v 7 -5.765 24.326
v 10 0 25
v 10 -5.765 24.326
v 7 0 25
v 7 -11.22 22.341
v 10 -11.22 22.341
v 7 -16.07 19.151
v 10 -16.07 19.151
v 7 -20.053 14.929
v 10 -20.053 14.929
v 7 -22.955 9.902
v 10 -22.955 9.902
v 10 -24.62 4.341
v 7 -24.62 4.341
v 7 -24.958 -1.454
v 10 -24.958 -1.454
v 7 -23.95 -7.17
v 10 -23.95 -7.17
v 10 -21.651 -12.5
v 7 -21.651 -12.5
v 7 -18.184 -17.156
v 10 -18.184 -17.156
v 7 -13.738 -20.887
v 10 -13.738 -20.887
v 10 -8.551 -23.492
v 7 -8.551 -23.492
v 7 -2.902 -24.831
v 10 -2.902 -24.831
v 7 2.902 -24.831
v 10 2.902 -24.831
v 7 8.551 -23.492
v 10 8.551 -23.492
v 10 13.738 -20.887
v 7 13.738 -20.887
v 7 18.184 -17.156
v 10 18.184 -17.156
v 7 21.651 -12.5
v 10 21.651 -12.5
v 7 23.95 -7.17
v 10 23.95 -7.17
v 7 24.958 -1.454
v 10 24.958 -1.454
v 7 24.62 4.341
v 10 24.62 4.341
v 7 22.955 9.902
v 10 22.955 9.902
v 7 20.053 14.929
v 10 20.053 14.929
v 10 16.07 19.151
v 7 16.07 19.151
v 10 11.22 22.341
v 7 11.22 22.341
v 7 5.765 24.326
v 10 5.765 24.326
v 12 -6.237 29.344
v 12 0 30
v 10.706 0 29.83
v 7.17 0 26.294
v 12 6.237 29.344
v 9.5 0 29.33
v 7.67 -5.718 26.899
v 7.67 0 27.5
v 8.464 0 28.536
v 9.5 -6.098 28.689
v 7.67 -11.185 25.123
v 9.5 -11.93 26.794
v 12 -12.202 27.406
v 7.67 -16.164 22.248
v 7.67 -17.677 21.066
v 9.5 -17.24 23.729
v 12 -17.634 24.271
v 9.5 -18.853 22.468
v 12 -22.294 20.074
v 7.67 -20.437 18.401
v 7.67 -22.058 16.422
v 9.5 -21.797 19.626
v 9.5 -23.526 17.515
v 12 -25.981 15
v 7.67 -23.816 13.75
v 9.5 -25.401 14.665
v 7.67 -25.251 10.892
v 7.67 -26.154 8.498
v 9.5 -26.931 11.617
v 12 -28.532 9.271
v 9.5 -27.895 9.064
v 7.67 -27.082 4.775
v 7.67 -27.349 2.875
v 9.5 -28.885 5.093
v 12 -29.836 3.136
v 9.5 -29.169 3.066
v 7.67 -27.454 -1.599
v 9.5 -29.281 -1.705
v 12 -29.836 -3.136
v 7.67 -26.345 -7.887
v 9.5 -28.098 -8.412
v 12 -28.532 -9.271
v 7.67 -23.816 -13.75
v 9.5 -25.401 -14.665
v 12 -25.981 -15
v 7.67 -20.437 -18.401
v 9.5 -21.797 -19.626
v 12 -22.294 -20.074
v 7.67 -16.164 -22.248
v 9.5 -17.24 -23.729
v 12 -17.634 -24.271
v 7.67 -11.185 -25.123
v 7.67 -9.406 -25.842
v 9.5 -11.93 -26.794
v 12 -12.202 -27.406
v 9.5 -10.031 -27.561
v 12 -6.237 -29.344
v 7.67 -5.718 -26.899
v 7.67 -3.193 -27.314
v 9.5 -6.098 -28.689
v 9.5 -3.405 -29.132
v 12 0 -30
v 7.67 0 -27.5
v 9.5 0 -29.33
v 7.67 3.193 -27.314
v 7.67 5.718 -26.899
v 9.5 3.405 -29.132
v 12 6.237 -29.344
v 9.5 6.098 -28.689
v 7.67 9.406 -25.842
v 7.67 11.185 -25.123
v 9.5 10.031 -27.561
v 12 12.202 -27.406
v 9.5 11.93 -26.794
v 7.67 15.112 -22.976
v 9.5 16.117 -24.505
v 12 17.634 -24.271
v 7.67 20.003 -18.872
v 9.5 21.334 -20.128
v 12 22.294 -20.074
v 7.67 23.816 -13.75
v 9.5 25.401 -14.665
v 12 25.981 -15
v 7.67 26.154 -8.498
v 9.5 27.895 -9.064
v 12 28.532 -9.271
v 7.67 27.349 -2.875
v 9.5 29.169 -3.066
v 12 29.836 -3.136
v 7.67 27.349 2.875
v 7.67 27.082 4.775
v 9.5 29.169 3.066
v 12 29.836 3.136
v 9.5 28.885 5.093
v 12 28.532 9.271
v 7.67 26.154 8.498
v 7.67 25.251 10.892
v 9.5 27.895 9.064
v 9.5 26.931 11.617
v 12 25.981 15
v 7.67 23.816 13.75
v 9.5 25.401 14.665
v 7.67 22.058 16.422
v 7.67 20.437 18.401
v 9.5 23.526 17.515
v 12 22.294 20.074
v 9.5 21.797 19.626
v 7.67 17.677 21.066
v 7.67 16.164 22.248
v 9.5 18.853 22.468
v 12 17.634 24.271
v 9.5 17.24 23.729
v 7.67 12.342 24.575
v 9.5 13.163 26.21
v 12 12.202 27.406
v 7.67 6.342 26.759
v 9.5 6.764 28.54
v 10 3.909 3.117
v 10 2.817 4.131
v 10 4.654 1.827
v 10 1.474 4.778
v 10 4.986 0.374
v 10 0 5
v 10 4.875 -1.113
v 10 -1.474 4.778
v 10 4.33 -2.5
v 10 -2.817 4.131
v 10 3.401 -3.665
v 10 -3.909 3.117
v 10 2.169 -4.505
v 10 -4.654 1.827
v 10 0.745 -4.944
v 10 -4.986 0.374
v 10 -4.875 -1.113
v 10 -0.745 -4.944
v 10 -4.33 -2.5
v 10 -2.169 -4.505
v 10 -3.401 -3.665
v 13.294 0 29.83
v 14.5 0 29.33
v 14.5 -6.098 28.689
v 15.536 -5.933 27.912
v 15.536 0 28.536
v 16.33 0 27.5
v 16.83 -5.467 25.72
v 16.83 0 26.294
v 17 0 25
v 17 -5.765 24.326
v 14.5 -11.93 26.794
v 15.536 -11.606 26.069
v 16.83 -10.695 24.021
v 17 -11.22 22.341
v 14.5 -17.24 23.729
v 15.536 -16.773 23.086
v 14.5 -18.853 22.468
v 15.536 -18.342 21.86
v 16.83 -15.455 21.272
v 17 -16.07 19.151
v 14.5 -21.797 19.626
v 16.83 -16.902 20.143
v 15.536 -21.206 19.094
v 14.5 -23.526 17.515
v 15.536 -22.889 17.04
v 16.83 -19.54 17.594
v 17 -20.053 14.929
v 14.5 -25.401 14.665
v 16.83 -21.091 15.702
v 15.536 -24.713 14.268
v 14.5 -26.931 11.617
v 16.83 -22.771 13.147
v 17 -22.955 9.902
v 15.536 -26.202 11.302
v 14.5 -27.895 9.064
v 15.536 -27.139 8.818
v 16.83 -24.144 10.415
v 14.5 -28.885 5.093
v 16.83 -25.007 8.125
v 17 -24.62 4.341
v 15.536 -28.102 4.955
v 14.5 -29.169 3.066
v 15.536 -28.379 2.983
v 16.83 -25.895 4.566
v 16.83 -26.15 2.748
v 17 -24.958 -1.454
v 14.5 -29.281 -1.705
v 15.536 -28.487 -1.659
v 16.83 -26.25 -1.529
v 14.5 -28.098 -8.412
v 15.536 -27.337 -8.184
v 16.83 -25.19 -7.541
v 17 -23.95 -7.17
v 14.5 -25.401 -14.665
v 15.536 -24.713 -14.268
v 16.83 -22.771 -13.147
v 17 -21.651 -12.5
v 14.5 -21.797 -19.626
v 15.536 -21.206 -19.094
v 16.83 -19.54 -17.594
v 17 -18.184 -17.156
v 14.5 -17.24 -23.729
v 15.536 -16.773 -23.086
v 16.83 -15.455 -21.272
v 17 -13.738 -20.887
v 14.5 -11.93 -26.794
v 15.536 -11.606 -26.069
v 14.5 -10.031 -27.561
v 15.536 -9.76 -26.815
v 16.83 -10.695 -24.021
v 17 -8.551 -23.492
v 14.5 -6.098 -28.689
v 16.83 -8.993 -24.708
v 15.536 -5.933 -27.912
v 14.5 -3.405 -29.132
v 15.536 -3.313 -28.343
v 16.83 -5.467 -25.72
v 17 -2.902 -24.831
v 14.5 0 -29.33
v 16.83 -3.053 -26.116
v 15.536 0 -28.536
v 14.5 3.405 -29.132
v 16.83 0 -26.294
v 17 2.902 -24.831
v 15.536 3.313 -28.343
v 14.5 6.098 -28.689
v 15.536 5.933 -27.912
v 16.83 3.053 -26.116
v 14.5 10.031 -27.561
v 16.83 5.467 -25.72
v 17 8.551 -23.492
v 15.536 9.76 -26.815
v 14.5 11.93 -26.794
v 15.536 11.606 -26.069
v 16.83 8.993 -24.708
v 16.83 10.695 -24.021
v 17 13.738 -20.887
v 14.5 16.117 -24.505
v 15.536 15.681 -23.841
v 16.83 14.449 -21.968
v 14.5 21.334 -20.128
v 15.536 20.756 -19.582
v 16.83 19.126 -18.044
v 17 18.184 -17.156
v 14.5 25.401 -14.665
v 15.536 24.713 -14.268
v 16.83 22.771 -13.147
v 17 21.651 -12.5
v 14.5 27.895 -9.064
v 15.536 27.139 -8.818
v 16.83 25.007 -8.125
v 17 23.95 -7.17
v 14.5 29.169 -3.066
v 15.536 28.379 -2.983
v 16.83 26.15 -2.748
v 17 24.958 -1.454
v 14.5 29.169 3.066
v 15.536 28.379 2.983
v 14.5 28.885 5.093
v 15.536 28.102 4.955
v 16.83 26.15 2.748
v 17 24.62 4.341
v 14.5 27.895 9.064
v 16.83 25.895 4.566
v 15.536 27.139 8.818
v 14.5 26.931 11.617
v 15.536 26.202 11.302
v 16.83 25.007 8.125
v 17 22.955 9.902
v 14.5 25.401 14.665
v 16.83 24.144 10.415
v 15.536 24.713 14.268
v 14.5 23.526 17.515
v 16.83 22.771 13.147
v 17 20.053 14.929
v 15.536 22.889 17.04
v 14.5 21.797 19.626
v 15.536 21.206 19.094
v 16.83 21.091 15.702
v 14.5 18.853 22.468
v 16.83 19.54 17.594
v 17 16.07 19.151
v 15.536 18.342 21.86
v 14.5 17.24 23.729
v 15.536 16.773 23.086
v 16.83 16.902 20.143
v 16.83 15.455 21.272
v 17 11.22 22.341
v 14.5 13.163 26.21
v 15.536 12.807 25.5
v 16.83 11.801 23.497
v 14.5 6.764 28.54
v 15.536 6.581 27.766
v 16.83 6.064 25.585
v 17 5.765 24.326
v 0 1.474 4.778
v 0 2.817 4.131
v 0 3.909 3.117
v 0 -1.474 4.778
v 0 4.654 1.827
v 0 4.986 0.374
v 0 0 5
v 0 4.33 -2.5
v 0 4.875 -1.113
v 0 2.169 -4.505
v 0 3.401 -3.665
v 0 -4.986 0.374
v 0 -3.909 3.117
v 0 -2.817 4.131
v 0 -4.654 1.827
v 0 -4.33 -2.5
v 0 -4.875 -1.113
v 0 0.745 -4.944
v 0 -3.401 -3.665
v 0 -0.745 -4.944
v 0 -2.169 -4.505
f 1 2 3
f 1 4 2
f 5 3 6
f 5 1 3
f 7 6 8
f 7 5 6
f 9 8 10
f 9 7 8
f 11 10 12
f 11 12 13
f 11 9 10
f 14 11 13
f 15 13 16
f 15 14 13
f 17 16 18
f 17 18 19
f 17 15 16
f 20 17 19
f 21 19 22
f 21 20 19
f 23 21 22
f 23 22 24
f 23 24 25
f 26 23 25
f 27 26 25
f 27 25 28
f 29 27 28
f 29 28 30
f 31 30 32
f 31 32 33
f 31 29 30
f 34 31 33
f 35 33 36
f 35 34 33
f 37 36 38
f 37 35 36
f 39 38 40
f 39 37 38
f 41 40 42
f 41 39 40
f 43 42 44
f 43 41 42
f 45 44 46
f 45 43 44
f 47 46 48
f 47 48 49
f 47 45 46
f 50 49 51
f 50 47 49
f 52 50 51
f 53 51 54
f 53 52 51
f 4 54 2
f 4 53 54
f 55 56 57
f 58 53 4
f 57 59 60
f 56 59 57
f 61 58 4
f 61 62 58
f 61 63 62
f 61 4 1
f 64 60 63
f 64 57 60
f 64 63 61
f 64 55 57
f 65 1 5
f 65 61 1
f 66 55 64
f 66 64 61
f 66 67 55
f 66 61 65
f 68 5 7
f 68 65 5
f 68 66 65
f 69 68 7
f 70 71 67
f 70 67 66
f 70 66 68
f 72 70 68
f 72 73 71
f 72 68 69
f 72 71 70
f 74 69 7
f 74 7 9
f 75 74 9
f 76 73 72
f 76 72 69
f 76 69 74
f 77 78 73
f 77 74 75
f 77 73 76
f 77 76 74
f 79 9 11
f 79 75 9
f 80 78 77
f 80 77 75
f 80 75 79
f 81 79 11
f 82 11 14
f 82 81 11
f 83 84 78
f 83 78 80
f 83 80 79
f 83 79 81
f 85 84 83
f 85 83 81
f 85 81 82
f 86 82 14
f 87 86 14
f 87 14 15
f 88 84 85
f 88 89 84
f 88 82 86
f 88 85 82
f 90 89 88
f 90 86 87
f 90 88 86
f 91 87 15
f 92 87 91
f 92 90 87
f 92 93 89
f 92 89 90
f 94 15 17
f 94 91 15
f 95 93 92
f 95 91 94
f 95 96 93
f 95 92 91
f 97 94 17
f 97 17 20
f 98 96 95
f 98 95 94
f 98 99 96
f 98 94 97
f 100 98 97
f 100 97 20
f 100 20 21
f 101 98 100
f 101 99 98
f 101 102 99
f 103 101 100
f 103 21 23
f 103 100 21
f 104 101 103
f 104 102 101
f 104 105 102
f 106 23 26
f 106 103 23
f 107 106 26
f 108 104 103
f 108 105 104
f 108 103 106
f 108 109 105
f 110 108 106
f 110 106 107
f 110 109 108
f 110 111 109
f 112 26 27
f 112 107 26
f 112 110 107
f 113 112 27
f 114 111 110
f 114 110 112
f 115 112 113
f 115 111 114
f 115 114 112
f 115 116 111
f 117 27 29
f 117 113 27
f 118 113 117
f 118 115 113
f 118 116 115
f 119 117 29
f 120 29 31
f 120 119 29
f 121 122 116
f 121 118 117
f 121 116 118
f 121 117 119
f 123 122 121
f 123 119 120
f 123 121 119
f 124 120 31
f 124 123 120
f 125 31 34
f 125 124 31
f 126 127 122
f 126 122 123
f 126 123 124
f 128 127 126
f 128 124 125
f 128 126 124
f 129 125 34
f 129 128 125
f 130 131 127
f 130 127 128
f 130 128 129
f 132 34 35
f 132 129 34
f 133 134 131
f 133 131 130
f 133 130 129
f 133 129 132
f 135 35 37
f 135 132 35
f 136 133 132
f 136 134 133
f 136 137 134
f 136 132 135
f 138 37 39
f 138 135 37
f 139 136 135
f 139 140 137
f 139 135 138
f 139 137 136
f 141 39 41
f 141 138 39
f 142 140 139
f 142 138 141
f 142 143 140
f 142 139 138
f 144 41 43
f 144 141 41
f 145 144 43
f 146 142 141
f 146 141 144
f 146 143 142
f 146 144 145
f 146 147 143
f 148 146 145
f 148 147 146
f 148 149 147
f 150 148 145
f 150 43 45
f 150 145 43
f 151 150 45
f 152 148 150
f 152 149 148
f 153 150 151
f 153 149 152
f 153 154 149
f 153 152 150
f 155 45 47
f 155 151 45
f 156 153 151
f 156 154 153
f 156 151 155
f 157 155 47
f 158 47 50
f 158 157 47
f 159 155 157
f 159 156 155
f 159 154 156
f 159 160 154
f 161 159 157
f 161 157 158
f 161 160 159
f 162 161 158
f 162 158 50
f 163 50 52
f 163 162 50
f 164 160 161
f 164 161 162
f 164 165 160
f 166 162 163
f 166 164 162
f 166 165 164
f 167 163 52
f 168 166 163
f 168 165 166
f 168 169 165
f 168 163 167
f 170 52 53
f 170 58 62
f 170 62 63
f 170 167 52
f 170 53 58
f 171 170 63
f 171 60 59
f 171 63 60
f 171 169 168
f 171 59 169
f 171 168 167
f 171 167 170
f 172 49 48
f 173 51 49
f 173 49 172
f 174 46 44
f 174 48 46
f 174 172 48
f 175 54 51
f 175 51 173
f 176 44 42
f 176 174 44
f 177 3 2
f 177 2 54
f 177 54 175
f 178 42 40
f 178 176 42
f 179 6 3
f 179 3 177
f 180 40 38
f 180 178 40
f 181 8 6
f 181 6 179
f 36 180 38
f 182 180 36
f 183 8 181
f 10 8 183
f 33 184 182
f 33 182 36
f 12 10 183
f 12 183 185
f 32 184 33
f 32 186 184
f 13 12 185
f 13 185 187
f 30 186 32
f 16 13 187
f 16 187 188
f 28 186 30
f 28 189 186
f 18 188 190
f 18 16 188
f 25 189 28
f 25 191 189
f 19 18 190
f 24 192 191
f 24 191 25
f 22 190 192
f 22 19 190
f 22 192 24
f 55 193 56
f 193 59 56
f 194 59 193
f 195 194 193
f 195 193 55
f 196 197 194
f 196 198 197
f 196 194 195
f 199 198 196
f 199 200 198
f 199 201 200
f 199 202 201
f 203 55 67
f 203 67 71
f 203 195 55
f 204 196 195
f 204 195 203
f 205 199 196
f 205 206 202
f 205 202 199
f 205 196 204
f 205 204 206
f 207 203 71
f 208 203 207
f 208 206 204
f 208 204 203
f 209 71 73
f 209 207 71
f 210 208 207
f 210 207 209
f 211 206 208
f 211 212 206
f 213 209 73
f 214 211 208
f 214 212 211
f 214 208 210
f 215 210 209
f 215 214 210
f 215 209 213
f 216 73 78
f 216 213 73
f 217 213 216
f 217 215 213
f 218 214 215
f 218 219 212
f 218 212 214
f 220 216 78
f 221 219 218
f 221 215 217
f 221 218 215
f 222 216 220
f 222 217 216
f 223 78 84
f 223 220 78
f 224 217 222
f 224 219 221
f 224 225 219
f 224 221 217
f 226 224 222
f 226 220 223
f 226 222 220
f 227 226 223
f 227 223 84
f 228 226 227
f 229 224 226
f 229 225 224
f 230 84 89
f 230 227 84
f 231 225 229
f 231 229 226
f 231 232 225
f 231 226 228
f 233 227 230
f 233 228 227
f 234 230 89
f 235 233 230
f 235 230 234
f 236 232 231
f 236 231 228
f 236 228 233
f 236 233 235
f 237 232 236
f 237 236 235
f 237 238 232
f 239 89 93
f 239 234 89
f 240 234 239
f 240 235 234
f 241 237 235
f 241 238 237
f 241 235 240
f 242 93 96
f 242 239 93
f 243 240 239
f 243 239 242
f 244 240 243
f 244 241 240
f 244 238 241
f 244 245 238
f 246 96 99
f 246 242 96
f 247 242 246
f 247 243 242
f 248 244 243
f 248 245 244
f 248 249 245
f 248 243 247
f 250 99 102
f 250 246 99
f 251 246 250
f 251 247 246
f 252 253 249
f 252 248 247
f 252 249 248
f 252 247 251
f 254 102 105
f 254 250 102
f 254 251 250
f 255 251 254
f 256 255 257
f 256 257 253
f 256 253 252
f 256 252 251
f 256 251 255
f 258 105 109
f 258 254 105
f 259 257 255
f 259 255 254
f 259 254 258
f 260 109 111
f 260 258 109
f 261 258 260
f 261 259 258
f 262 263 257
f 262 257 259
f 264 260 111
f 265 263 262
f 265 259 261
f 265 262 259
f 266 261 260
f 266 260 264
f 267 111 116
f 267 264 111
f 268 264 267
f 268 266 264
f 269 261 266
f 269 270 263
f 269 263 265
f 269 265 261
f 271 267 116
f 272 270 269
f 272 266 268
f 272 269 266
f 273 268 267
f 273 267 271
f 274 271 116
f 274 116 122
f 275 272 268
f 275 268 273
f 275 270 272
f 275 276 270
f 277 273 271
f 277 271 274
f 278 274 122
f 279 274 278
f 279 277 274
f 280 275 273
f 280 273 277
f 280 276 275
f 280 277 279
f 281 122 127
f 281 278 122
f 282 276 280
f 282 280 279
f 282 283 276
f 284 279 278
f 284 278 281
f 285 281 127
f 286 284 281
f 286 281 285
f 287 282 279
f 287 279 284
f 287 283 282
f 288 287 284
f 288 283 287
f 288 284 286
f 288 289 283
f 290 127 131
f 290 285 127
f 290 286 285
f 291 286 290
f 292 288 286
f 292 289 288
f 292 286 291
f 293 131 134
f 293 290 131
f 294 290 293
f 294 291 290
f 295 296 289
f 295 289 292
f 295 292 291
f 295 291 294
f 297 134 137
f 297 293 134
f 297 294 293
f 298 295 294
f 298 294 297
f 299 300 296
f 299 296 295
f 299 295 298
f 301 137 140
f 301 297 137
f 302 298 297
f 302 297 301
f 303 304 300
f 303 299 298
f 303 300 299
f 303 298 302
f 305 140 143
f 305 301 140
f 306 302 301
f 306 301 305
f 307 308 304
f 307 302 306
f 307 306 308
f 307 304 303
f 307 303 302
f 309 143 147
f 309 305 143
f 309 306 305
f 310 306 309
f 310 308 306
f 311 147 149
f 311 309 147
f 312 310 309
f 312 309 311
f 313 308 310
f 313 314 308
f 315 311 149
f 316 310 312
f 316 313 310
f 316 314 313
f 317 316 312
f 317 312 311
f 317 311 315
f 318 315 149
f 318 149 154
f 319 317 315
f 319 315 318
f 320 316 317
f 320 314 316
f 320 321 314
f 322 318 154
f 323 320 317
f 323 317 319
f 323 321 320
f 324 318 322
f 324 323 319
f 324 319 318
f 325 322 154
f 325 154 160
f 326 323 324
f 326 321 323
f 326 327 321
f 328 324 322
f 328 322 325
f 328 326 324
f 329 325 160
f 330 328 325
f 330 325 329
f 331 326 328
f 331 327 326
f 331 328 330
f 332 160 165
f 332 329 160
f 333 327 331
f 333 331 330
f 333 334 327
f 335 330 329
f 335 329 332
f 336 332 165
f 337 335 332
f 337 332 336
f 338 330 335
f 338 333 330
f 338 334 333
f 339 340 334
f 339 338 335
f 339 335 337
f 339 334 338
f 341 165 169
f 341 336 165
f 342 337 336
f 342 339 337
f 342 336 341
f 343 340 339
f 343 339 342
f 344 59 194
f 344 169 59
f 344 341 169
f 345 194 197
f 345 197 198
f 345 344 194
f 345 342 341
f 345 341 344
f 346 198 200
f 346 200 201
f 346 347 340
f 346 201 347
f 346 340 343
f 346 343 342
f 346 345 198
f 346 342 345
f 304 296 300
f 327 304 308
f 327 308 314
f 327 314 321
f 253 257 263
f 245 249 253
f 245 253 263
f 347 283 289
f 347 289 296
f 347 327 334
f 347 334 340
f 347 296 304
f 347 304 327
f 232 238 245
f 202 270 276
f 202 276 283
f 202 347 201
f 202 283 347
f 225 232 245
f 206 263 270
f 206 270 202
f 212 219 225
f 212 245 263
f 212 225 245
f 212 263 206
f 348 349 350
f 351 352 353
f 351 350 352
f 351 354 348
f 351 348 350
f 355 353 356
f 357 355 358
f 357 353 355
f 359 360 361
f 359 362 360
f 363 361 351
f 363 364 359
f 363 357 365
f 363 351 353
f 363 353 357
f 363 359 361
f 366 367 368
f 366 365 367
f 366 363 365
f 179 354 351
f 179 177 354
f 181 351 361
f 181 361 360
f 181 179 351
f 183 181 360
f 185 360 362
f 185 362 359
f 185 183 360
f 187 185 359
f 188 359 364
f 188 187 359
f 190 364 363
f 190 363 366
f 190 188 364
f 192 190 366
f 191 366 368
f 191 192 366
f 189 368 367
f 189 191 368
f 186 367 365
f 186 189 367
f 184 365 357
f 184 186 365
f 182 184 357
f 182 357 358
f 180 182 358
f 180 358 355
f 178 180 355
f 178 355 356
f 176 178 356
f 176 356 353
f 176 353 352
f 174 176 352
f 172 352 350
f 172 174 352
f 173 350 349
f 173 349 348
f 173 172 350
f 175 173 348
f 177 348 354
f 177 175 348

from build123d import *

# Parameters (mm, degrees)
FILLET1_R = 5


with BuildPart() as part:
    # Sketch1 → Revolve2 (revolve)
    with BuildSketch(Plane.XY, mode=Mode.PRIVATE) as revolve2_sk:
        Polygon((0, 0), (0, 5), (10, 5), (10, 25), (7, 25), (7, 30), (17, 30), (17, 0), align=None)
    revolve(revolve2_sk.sketch.rotate(Axis((0, 0, 0), (1, 0, 0)), 90), axis=Axis((0, 0, 0), (1, 0, 0)))

    # Fillet1
    fillet1_edges = [part.edges().sort_by_distance(p)[0] for p in [
        (7, 0, -30),
        (17, 0, -30),
    ]]
    fillet(fillet1_edges, radius=FILLET1_R - 0.0001)  # a hair under: the kernel refuses the full size


solid = part.part
